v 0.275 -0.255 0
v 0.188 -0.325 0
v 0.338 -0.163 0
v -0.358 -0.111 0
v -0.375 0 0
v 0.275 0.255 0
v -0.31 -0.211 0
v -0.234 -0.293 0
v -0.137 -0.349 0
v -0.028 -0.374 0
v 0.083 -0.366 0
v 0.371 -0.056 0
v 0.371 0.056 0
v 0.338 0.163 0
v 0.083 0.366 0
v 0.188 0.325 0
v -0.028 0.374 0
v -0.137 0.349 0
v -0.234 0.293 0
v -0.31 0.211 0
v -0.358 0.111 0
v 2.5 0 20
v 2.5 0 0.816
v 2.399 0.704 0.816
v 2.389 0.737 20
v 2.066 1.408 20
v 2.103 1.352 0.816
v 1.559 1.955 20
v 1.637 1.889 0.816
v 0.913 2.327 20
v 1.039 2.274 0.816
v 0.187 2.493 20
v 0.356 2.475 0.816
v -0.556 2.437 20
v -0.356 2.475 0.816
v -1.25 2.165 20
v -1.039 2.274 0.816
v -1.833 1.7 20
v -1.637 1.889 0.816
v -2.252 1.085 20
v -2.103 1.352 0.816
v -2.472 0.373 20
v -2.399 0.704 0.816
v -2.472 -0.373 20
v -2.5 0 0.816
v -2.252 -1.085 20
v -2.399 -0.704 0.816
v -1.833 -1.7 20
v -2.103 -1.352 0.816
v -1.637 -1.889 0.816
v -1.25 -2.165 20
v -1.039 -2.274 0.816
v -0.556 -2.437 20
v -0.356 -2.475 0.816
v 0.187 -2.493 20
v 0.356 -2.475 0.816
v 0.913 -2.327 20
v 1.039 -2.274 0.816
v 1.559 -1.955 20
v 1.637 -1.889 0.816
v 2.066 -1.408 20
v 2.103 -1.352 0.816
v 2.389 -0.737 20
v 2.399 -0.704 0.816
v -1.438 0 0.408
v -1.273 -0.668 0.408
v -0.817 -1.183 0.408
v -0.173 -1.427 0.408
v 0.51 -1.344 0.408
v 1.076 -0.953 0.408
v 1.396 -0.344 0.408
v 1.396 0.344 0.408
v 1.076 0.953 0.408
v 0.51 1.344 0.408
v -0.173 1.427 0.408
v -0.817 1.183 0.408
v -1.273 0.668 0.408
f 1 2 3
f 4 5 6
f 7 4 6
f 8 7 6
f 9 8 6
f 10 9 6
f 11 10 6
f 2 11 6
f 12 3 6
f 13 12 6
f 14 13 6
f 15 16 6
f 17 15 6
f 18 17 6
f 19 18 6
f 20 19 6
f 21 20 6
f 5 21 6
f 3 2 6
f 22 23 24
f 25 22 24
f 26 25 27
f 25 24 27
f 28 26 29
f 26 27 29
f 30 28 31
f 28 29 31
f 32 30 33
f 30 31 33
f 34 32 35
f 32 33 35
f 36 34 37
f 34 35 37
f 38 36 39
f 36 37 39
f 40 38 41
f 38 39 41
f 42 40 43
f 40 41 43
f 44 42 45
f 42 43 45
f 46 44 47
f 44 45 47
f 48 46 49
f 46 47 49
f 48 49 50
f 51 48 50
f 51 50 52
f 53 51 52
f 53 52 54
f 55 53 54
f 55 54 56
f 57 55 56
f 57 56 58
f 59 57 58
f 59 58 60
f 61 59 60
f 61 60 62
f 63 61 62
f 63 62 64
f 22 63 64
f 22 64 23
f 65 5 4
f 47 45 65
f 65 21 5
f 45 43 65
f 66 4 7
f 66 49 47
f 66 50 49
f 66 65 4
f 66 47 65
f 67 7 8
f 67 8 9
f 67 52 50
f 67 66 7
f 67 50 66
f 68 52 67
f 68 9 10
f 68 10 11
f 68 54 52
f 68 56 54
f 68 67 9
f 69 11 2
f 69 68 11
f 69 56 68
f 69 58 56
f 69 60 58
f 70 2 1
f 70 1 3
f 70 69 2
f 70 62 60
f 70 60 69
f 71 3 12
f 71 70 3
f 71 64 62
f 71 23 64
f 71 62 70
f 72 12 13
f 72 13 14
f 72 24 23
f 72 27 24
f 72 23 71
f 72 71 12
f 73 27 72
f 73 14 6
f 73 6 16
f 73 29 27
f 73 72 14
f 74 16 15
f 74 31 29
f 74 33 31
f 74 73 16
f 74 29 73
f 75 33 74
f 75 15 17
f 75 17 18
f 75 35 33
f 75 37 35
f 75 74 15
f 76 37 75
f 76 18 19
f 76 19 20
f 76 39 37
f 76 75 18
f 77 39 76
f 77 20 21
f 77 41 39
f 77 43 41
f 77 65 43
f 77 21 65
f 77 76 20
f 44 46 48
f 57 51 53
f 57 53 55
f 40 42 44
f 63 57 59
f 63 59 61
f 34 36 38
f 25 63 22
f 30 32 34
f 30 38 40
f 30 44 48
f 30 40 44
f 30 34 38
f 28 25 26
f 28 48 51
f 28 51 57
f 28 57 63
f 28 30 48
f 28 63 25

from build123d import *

# Parameters (mm, degrees)
CYLINDER_R     = 2.5
CYLINDER_DEPTH = 20


with BuildPart() as nozzle_revolution:
    # Sketch006 → Revolution (revolve)
    with BuildSketch(Plane.XZ):
        Polygon((-0.375, 0), (-2.5, 0.815711), (-2.5, 0), align=None)
    revolve(axis=Axis((0, 0, 0), (0, 0, 1)))


with BuildPart() as nozzle_cut:
    # Cylinder → Cylinder (new body)
    with BuildSketch(Plane.XY):
        Circle(CYLINDER_R)
    extrude(amount=CYLINDER_DEPTH)

    # Cut: cut nozzle-revolution
    add(nozzle_revolution.part, mode=Mode.SUBTRACT)


solid = nozzle_cut.part
